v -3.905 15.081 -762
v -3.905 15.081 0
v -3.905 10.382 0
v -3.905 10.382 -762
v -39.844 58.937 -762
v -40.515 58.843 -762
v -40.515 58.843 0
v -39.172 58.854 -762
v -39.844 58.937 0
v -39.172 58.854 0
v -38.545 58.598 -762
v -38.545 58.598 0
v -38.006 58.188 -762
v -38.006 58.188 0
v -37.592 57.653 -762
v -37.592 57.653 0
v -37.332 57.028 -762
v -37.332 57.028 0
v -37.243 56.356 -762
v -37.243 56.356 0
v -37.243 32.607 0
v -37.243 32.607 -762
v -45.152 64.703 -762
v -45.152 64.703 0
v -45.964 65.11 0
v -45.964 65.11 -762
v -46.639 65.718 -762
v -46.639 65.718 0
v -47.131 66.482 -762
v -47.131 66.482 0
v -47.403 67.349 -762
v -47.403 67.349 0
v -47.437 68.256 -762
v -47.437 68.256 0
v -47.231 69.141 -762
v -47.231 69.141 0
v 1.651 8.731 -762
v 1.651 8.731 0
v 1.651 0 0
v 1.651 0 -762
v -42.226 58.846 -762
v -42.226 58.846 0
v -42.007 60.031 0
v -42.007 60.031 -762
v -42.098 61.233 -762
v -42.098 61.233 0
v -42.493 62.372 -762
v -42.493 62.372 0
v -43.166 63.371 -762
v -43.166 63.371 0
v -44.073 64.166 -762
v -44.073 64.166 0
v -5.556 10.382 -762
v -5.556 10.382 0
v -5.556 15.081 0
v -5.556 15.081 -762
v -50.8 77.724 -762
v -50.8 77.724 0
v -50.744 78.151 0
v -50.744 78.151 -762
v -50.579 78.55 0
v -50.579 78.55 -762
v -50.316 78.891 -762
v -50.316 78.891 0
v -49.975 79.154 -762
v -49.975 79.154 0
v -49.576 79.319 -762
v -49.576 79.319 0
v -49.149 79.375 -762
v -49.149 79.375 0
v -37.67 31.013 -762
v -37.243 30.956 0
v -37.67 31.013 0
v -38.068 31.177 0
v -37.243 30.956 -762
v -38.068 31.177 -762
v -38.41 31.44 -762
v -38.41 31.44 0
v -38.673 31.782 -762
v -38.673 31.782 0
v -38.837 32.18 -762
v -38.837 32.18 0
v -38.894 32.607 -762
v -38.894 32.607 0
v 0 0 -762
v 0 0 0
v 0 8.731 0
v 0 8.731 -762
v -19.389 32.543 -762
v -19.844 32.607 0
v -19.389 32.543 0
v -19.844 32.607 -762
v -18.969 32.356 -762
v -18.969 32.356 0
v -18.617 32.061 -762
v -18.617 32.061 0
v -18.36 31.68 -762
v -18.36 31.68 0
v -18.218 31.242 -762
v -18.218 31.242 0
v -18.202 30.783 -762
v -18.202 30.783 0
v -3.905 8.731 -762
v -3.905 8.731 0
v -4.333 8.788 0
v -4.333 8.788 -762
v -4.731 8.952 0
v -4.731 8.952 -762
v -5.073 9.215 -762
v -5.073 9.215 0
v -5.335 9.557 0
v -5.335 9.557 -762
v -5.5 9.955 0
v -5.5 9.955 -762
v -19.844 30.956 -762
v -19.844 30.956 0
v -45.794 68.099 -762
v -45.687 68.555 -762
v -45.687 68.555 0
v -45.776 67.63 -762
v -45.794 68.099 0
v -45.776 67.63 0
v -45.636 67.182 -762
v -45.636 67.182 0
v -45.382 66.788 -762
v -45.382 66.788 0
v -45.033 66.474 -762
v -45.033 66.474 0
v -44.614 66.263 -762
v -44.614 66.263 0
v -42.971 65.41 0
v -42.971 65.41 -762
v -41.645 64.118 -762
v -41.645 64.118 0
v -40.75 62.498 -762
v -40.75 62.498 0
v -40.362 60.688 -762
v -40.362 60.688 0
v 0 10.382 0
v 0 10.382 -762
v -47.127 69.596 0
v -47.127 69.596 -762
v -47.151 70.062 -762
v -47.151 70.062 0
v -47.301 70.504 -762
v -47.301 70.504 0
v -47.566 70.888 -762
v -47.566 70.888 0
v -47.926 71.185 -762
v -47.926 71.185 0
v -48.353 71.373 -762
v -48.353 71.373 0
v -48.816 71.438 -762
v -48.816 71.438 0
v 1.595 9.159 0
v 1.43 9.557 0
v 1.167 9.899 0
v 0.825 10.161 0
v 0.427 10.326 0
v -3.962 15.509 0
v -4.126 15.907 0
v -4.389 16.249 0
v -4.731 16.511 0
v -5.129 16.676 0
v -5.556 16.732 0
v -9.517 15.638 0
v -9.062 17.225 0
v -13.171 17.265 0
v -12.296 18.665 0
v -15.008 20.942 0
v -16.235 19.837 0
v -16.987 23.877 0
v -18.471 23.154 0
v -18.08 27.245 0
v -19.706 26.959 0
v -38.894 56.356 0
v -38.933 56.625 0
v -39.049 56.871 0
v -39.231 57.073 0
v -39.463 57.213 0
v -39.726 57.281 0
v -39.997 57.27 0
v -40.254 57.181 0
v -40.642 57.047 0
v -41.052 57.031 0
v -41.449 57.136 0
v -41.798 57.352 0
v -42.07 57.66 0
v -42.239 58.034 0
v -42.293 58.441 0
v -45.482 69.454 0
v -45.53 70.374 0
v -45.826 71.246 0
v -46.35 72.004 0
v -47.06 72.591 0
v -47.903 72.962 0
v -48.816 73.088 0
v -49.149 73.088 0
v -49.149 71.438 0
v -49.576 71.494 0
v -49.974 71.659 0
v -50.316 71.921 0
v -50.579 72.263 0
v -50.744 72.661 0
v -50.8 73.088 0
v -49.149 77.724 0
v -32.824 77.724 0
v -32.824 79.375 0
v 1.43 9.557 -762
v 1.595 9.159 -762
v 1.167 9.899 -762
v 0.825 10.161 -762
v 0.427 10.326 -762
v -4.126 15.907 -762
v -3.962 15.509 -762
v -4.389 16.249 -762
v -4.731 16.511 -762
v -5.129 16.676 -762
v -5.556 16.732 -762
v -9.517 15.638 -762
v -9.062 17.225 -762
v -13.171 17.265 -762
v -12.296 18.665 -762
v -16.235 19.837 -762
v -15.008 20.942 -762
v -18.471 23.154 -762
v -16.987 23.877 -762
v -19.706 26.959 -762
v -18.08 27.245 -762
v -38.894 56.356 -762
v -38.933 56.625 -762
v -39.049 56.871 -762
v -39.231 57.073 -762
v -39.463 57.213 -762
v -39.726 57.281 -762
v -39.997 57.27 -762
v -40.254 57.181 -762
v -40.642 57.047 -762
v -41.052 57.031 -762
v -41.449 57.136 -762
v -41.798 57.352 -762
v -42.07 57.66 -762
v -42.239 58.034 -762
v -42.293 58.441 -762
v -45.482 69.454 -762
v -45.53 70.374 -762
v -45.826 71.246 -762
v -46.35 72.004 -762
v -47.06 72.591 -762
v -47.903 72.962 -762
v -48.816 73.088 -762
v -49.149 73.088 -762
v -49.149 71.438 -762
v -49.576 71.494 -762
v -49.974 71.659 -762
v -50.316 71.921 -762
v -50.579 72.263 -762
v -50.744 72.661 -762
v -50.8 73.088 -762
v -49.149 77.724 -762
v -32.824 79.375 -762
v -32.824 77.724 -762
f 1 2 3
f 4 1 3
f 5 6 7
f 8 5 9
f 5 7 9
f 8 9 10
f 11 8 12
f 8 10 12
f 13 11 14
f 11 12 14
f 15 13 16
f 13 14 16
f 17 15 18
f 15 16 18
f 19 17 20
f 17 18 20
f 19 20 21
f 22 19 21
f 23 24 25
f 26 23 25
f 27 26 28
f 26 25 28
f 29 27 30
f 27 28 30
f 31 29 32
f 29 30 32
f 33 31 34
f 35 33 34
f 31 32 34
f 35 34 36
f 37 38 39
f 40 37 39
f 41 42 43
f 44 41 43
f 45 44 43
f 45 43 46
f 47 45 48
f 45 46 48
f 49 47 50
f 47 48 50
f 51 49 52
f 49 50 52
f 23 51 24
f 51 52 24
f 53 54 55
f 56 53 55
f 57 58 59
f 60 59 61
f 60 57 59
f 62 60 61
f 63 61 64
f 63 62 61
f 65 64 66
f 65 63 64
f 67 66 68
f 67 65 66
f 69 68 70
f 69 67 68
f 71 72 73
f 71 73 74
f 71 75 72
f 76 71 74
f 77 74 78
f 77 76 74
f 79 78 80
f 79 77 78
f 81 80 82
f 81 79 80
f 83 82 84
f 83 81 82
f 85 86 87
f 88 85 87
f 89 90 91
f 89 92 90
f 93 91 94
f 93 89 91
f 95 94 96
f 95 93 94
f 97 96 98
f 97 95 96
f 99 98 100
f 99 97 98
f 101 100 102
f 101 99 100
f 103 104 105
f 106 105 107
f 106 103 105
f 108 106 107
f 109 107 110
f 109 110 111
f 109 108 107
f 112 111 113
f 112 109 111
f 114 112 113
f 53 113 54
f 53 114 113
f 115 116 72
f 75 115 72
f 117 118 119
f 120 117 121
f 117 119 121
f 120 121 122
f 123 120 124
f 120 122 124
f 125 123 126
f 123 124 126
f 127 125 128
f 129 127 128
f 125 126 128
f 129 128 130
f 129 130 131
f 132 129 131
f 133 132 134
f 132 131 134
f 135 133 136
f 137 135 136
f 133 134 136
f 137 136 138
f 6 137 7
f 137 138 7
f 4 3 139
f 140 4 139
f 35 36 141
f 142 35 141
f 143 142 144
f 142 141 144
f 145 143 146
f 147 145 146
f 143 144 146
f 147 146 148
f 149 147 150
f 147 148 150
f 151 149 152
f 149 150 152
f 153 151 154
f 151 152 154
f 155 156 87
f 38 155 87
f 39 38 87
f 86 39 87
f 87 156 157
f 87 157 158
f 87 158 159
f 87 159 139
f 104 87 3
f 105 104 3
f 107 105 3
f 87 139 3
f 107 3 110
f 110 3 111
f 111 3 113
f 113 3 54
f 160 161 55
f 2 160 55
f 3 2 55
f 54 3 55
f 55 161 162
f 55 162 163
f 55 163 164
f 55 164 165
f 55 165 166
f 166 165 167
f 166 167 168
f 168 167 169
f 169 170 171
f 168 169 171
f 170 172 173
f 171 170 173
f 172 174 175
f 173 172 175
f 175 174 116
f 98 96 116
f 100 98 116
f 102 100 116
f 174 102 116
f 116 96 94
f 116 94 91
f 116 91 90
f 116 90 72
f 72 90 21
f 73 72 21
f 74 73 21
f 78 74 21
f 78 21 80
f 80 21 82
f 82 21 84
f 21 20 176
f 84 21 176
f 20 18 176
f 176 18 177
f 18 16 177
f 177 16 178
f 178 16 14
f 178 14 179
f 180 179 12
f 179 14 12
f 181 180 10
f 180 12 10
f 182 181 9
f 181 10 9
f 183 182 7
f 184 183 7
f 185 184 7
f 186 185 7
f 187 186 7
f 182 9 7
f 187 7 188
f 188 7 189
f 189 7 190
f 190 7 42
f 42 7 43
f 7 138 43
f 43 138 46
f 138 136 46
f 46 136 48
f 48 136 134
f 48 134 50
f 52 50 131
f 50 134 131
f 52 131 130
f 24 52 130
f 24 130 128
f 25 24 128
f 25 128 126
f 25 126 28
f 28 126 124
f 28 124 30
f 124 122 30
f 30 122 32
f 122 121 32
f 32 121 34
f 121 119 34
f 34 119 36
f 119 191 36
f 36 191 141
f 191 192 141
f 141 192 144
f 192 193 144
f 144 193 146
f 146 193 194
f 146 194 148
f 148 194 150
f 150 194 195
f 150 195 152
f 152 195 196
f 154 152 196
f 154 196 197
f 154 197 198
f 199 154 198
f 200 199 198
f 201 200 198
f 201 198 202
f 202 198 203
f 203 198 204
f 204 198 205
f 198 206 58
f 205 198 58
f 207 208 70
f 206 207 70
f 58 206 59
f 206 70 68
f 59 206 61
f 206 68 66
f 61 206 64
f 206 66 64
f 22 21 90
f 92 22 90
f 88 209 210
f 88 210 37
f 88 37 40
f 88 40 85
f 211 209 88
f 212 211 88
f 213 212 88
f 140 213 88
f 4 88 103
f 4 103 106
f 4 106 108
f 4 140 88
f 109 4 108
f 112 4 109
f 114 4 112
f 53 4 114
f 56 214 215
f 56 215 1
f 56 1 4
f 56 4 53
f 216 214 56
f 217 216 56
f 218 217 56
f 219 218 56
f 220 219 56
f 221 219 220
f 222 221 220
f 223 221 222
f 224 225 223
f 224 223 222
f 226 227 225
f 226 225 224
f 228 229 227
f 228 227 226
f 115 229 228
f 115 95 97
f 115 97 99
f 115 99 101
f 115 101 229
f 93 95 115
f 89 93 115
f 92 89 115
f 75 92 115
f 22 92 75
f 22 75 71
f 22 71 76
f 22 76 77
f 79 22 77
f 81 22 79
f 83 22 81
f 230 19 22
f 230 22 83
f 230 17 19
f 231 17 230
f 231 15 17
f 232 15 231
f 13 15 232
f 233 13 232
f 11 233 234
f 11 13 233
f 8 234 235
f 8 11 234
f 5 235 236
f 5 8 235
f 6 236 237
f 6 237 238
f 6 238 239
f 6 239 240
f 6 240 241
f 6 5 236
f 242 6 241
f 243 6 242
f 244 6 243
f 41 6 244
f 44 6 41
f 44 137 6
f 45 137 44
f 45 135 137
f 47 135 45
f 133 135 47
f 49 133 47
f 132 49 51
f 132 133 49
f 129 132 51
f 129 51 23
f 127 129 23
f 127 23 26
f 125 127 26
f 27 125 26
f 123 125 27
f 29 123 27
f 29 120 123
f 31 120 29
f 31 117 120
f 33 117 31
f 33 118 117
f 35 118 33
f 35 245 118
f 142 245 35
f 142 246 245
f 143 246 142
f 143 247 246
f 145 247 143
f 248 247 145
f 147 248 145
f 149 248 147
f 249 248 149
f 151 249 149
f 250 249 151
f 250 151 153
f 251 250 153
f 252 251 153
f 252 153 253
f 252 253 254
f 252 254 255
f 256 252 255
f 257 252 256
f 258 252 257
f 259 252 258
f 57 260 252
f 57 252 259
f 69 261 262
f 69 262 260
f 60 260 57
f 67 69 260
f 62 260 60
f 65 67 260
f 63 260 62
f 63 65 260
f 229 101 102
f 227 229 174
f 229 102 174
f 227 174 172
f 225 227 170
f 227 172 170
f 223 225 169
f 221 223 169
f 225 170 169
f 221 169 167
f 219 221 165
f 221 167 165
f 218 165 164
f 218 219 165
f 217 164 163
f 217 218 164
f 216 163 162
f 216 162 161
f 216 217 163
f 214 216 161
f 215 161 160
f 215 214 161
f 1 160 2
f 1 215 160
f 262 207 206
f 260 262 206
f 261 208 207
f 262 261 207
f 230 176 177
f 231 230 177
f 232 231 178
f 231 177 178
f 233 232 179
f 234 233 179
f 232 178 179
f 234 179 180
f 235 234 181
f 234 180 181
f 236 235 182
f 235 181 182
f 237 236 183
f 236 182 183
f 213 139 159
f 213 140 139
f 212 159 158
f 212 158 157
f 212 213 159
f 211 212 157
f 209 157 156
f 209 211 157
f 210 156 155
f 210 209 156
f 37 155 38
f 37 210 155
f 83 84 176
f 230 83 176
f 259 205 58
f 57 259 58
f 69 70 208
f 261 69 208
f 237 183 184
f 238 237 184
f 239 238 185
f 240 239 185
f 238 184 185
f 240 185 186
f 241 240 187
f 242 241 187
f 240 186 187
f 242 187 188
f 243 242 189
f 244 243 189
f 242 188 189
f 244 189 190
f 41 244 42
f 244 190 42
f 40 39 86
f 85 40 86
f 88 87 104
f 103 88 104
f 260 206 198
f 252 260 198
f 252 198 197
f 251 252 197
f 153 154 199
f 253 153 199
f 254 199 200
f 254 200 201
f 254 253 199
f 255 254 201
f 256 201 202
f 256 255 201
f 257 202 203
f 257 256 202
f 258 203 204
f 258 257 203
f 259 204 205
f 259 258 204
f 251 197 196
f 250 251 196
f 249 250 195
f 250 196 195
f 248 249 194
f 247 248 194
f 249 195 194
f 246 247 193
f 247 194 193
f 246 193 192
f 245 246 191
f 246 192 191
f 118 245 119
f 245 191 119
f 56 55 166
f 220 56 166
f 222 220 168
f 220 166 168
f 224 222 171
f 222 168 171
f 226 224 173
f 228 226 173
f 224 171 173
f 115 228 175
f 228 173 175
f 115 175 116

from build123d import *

# Parameters (mm, degrees)
EXTRUDE_THIN1_DEPTH = 762
FILLET1_R           = 1.651


with BuildPart() as part:
    # Sketch1 → Extrude-Thin1 (new body)
    with BuildSketch(Plane.XY):
        with BuildLine():
            Line((0, 0), (0, 8.73125))
            Line((0, 8.73125), (-5.55625, 8.73125))
            Line((-5.55625, 8.73125), (-5.55625, 15.08125))
            ThreePointArc((-5.55625, 15.08125), (-16.235064, 19.837192), (-19.84375, 30.95625))
            Line((-19.84375, 30.95625), (-38.89375, 30.95625))
            Line((-38.89375, 30.95625), (-38.89375, 56.35625))
            ThreePointArc((-38.89375, 56.35625), (-39.341606, 57.151515), (-40.253834, 57.180844))
            ThreePointArc((-40.253834, 57.180844), (-41.798306, 57.35168), (-42.225966, 58.845562))
            ThreePointArc((-42.225966, 58.845562), (-42.493091, 62.371576), (-45.152095, 64.702632))
            ThreePointArc((-45.152095, 64.702632), (-47.13073, 66.482003), (-47.230922, 69.14116))
            ThreePointArc((-47.230922, 69.14116), (-47.420593, 70.70524), (-48.815625, 71.4375))
            Line((-48.815625, 71.4375), (-50.8, 71.4375))
            Line((-50.8, 71.4375), (-50.8, 79.375))
            Line((-50.8, 79.375), (-32.823706, 79.375))
            Line((-32.823706, 79.375), (-32.823706, 77.724))
            Line((-32.823706, 77.724), (-49.149, 77.724))
            Line((-49.149, 77.724), (-49.149, 73.0885))
            Line((-49.149, 73.0885), (-48.815625, 73.0885))
            ThreePointArc((-48.815625, 73.0885), (-46.061751, 71.642976), (-45.68733, 68.555392))
            ThreePointArc((-45.68733, 68.555392), (-45.635593, 67.182265), (-44.613871, 66.263439))
            ThreePointArc((-44.613871, 66.263439), (-41.137974, 63.341171), (-40.514728, 58.843051))
            ThreePointArc((-40.514728, 58.843051), (-38.261995, 58.411123), (-37.24275, 56.35625))
            Line((-37.24275, 56.35625), (-37.24275, 32.60725))
            Line((-37.24275, 32.60725), (-17.87345, 32.60725))
            ThreePointArc((-17.87345, 32.60725), (-15.074359, 21.016098), (-3.90525, 16.839887))
            Line((-3.90525, 16.839887), (-3.90525, 10.38225))
            Line((-3.90525, 10.38225), (1.651, 10.38225))
            Line((1.651, 10.38225), (1.651, 0))
            Line((1.651, 0), (0, 0))
        make_face()
    extrude(amount=-EXTRUDE_THIN1_DEPTH)

    # Fillet1
    fillet1_edges = [part.edges().sort_by_distance(p)[0] for p in [
        (-17.87345, 32.60725, -381),
        (-3.90525, 16.839887, -381),
        (1.651, 10.38225, -381),
        (-5.55625, 8.73125, -381),
        (-38.89375, 30.95625, -381),
        (-50.8, 71.4375, -381),
        (-50.8, 79.375, -381),
    ]]
    fillet(fillet1_edges, radius=FILLET1_R)


solid = part.part
